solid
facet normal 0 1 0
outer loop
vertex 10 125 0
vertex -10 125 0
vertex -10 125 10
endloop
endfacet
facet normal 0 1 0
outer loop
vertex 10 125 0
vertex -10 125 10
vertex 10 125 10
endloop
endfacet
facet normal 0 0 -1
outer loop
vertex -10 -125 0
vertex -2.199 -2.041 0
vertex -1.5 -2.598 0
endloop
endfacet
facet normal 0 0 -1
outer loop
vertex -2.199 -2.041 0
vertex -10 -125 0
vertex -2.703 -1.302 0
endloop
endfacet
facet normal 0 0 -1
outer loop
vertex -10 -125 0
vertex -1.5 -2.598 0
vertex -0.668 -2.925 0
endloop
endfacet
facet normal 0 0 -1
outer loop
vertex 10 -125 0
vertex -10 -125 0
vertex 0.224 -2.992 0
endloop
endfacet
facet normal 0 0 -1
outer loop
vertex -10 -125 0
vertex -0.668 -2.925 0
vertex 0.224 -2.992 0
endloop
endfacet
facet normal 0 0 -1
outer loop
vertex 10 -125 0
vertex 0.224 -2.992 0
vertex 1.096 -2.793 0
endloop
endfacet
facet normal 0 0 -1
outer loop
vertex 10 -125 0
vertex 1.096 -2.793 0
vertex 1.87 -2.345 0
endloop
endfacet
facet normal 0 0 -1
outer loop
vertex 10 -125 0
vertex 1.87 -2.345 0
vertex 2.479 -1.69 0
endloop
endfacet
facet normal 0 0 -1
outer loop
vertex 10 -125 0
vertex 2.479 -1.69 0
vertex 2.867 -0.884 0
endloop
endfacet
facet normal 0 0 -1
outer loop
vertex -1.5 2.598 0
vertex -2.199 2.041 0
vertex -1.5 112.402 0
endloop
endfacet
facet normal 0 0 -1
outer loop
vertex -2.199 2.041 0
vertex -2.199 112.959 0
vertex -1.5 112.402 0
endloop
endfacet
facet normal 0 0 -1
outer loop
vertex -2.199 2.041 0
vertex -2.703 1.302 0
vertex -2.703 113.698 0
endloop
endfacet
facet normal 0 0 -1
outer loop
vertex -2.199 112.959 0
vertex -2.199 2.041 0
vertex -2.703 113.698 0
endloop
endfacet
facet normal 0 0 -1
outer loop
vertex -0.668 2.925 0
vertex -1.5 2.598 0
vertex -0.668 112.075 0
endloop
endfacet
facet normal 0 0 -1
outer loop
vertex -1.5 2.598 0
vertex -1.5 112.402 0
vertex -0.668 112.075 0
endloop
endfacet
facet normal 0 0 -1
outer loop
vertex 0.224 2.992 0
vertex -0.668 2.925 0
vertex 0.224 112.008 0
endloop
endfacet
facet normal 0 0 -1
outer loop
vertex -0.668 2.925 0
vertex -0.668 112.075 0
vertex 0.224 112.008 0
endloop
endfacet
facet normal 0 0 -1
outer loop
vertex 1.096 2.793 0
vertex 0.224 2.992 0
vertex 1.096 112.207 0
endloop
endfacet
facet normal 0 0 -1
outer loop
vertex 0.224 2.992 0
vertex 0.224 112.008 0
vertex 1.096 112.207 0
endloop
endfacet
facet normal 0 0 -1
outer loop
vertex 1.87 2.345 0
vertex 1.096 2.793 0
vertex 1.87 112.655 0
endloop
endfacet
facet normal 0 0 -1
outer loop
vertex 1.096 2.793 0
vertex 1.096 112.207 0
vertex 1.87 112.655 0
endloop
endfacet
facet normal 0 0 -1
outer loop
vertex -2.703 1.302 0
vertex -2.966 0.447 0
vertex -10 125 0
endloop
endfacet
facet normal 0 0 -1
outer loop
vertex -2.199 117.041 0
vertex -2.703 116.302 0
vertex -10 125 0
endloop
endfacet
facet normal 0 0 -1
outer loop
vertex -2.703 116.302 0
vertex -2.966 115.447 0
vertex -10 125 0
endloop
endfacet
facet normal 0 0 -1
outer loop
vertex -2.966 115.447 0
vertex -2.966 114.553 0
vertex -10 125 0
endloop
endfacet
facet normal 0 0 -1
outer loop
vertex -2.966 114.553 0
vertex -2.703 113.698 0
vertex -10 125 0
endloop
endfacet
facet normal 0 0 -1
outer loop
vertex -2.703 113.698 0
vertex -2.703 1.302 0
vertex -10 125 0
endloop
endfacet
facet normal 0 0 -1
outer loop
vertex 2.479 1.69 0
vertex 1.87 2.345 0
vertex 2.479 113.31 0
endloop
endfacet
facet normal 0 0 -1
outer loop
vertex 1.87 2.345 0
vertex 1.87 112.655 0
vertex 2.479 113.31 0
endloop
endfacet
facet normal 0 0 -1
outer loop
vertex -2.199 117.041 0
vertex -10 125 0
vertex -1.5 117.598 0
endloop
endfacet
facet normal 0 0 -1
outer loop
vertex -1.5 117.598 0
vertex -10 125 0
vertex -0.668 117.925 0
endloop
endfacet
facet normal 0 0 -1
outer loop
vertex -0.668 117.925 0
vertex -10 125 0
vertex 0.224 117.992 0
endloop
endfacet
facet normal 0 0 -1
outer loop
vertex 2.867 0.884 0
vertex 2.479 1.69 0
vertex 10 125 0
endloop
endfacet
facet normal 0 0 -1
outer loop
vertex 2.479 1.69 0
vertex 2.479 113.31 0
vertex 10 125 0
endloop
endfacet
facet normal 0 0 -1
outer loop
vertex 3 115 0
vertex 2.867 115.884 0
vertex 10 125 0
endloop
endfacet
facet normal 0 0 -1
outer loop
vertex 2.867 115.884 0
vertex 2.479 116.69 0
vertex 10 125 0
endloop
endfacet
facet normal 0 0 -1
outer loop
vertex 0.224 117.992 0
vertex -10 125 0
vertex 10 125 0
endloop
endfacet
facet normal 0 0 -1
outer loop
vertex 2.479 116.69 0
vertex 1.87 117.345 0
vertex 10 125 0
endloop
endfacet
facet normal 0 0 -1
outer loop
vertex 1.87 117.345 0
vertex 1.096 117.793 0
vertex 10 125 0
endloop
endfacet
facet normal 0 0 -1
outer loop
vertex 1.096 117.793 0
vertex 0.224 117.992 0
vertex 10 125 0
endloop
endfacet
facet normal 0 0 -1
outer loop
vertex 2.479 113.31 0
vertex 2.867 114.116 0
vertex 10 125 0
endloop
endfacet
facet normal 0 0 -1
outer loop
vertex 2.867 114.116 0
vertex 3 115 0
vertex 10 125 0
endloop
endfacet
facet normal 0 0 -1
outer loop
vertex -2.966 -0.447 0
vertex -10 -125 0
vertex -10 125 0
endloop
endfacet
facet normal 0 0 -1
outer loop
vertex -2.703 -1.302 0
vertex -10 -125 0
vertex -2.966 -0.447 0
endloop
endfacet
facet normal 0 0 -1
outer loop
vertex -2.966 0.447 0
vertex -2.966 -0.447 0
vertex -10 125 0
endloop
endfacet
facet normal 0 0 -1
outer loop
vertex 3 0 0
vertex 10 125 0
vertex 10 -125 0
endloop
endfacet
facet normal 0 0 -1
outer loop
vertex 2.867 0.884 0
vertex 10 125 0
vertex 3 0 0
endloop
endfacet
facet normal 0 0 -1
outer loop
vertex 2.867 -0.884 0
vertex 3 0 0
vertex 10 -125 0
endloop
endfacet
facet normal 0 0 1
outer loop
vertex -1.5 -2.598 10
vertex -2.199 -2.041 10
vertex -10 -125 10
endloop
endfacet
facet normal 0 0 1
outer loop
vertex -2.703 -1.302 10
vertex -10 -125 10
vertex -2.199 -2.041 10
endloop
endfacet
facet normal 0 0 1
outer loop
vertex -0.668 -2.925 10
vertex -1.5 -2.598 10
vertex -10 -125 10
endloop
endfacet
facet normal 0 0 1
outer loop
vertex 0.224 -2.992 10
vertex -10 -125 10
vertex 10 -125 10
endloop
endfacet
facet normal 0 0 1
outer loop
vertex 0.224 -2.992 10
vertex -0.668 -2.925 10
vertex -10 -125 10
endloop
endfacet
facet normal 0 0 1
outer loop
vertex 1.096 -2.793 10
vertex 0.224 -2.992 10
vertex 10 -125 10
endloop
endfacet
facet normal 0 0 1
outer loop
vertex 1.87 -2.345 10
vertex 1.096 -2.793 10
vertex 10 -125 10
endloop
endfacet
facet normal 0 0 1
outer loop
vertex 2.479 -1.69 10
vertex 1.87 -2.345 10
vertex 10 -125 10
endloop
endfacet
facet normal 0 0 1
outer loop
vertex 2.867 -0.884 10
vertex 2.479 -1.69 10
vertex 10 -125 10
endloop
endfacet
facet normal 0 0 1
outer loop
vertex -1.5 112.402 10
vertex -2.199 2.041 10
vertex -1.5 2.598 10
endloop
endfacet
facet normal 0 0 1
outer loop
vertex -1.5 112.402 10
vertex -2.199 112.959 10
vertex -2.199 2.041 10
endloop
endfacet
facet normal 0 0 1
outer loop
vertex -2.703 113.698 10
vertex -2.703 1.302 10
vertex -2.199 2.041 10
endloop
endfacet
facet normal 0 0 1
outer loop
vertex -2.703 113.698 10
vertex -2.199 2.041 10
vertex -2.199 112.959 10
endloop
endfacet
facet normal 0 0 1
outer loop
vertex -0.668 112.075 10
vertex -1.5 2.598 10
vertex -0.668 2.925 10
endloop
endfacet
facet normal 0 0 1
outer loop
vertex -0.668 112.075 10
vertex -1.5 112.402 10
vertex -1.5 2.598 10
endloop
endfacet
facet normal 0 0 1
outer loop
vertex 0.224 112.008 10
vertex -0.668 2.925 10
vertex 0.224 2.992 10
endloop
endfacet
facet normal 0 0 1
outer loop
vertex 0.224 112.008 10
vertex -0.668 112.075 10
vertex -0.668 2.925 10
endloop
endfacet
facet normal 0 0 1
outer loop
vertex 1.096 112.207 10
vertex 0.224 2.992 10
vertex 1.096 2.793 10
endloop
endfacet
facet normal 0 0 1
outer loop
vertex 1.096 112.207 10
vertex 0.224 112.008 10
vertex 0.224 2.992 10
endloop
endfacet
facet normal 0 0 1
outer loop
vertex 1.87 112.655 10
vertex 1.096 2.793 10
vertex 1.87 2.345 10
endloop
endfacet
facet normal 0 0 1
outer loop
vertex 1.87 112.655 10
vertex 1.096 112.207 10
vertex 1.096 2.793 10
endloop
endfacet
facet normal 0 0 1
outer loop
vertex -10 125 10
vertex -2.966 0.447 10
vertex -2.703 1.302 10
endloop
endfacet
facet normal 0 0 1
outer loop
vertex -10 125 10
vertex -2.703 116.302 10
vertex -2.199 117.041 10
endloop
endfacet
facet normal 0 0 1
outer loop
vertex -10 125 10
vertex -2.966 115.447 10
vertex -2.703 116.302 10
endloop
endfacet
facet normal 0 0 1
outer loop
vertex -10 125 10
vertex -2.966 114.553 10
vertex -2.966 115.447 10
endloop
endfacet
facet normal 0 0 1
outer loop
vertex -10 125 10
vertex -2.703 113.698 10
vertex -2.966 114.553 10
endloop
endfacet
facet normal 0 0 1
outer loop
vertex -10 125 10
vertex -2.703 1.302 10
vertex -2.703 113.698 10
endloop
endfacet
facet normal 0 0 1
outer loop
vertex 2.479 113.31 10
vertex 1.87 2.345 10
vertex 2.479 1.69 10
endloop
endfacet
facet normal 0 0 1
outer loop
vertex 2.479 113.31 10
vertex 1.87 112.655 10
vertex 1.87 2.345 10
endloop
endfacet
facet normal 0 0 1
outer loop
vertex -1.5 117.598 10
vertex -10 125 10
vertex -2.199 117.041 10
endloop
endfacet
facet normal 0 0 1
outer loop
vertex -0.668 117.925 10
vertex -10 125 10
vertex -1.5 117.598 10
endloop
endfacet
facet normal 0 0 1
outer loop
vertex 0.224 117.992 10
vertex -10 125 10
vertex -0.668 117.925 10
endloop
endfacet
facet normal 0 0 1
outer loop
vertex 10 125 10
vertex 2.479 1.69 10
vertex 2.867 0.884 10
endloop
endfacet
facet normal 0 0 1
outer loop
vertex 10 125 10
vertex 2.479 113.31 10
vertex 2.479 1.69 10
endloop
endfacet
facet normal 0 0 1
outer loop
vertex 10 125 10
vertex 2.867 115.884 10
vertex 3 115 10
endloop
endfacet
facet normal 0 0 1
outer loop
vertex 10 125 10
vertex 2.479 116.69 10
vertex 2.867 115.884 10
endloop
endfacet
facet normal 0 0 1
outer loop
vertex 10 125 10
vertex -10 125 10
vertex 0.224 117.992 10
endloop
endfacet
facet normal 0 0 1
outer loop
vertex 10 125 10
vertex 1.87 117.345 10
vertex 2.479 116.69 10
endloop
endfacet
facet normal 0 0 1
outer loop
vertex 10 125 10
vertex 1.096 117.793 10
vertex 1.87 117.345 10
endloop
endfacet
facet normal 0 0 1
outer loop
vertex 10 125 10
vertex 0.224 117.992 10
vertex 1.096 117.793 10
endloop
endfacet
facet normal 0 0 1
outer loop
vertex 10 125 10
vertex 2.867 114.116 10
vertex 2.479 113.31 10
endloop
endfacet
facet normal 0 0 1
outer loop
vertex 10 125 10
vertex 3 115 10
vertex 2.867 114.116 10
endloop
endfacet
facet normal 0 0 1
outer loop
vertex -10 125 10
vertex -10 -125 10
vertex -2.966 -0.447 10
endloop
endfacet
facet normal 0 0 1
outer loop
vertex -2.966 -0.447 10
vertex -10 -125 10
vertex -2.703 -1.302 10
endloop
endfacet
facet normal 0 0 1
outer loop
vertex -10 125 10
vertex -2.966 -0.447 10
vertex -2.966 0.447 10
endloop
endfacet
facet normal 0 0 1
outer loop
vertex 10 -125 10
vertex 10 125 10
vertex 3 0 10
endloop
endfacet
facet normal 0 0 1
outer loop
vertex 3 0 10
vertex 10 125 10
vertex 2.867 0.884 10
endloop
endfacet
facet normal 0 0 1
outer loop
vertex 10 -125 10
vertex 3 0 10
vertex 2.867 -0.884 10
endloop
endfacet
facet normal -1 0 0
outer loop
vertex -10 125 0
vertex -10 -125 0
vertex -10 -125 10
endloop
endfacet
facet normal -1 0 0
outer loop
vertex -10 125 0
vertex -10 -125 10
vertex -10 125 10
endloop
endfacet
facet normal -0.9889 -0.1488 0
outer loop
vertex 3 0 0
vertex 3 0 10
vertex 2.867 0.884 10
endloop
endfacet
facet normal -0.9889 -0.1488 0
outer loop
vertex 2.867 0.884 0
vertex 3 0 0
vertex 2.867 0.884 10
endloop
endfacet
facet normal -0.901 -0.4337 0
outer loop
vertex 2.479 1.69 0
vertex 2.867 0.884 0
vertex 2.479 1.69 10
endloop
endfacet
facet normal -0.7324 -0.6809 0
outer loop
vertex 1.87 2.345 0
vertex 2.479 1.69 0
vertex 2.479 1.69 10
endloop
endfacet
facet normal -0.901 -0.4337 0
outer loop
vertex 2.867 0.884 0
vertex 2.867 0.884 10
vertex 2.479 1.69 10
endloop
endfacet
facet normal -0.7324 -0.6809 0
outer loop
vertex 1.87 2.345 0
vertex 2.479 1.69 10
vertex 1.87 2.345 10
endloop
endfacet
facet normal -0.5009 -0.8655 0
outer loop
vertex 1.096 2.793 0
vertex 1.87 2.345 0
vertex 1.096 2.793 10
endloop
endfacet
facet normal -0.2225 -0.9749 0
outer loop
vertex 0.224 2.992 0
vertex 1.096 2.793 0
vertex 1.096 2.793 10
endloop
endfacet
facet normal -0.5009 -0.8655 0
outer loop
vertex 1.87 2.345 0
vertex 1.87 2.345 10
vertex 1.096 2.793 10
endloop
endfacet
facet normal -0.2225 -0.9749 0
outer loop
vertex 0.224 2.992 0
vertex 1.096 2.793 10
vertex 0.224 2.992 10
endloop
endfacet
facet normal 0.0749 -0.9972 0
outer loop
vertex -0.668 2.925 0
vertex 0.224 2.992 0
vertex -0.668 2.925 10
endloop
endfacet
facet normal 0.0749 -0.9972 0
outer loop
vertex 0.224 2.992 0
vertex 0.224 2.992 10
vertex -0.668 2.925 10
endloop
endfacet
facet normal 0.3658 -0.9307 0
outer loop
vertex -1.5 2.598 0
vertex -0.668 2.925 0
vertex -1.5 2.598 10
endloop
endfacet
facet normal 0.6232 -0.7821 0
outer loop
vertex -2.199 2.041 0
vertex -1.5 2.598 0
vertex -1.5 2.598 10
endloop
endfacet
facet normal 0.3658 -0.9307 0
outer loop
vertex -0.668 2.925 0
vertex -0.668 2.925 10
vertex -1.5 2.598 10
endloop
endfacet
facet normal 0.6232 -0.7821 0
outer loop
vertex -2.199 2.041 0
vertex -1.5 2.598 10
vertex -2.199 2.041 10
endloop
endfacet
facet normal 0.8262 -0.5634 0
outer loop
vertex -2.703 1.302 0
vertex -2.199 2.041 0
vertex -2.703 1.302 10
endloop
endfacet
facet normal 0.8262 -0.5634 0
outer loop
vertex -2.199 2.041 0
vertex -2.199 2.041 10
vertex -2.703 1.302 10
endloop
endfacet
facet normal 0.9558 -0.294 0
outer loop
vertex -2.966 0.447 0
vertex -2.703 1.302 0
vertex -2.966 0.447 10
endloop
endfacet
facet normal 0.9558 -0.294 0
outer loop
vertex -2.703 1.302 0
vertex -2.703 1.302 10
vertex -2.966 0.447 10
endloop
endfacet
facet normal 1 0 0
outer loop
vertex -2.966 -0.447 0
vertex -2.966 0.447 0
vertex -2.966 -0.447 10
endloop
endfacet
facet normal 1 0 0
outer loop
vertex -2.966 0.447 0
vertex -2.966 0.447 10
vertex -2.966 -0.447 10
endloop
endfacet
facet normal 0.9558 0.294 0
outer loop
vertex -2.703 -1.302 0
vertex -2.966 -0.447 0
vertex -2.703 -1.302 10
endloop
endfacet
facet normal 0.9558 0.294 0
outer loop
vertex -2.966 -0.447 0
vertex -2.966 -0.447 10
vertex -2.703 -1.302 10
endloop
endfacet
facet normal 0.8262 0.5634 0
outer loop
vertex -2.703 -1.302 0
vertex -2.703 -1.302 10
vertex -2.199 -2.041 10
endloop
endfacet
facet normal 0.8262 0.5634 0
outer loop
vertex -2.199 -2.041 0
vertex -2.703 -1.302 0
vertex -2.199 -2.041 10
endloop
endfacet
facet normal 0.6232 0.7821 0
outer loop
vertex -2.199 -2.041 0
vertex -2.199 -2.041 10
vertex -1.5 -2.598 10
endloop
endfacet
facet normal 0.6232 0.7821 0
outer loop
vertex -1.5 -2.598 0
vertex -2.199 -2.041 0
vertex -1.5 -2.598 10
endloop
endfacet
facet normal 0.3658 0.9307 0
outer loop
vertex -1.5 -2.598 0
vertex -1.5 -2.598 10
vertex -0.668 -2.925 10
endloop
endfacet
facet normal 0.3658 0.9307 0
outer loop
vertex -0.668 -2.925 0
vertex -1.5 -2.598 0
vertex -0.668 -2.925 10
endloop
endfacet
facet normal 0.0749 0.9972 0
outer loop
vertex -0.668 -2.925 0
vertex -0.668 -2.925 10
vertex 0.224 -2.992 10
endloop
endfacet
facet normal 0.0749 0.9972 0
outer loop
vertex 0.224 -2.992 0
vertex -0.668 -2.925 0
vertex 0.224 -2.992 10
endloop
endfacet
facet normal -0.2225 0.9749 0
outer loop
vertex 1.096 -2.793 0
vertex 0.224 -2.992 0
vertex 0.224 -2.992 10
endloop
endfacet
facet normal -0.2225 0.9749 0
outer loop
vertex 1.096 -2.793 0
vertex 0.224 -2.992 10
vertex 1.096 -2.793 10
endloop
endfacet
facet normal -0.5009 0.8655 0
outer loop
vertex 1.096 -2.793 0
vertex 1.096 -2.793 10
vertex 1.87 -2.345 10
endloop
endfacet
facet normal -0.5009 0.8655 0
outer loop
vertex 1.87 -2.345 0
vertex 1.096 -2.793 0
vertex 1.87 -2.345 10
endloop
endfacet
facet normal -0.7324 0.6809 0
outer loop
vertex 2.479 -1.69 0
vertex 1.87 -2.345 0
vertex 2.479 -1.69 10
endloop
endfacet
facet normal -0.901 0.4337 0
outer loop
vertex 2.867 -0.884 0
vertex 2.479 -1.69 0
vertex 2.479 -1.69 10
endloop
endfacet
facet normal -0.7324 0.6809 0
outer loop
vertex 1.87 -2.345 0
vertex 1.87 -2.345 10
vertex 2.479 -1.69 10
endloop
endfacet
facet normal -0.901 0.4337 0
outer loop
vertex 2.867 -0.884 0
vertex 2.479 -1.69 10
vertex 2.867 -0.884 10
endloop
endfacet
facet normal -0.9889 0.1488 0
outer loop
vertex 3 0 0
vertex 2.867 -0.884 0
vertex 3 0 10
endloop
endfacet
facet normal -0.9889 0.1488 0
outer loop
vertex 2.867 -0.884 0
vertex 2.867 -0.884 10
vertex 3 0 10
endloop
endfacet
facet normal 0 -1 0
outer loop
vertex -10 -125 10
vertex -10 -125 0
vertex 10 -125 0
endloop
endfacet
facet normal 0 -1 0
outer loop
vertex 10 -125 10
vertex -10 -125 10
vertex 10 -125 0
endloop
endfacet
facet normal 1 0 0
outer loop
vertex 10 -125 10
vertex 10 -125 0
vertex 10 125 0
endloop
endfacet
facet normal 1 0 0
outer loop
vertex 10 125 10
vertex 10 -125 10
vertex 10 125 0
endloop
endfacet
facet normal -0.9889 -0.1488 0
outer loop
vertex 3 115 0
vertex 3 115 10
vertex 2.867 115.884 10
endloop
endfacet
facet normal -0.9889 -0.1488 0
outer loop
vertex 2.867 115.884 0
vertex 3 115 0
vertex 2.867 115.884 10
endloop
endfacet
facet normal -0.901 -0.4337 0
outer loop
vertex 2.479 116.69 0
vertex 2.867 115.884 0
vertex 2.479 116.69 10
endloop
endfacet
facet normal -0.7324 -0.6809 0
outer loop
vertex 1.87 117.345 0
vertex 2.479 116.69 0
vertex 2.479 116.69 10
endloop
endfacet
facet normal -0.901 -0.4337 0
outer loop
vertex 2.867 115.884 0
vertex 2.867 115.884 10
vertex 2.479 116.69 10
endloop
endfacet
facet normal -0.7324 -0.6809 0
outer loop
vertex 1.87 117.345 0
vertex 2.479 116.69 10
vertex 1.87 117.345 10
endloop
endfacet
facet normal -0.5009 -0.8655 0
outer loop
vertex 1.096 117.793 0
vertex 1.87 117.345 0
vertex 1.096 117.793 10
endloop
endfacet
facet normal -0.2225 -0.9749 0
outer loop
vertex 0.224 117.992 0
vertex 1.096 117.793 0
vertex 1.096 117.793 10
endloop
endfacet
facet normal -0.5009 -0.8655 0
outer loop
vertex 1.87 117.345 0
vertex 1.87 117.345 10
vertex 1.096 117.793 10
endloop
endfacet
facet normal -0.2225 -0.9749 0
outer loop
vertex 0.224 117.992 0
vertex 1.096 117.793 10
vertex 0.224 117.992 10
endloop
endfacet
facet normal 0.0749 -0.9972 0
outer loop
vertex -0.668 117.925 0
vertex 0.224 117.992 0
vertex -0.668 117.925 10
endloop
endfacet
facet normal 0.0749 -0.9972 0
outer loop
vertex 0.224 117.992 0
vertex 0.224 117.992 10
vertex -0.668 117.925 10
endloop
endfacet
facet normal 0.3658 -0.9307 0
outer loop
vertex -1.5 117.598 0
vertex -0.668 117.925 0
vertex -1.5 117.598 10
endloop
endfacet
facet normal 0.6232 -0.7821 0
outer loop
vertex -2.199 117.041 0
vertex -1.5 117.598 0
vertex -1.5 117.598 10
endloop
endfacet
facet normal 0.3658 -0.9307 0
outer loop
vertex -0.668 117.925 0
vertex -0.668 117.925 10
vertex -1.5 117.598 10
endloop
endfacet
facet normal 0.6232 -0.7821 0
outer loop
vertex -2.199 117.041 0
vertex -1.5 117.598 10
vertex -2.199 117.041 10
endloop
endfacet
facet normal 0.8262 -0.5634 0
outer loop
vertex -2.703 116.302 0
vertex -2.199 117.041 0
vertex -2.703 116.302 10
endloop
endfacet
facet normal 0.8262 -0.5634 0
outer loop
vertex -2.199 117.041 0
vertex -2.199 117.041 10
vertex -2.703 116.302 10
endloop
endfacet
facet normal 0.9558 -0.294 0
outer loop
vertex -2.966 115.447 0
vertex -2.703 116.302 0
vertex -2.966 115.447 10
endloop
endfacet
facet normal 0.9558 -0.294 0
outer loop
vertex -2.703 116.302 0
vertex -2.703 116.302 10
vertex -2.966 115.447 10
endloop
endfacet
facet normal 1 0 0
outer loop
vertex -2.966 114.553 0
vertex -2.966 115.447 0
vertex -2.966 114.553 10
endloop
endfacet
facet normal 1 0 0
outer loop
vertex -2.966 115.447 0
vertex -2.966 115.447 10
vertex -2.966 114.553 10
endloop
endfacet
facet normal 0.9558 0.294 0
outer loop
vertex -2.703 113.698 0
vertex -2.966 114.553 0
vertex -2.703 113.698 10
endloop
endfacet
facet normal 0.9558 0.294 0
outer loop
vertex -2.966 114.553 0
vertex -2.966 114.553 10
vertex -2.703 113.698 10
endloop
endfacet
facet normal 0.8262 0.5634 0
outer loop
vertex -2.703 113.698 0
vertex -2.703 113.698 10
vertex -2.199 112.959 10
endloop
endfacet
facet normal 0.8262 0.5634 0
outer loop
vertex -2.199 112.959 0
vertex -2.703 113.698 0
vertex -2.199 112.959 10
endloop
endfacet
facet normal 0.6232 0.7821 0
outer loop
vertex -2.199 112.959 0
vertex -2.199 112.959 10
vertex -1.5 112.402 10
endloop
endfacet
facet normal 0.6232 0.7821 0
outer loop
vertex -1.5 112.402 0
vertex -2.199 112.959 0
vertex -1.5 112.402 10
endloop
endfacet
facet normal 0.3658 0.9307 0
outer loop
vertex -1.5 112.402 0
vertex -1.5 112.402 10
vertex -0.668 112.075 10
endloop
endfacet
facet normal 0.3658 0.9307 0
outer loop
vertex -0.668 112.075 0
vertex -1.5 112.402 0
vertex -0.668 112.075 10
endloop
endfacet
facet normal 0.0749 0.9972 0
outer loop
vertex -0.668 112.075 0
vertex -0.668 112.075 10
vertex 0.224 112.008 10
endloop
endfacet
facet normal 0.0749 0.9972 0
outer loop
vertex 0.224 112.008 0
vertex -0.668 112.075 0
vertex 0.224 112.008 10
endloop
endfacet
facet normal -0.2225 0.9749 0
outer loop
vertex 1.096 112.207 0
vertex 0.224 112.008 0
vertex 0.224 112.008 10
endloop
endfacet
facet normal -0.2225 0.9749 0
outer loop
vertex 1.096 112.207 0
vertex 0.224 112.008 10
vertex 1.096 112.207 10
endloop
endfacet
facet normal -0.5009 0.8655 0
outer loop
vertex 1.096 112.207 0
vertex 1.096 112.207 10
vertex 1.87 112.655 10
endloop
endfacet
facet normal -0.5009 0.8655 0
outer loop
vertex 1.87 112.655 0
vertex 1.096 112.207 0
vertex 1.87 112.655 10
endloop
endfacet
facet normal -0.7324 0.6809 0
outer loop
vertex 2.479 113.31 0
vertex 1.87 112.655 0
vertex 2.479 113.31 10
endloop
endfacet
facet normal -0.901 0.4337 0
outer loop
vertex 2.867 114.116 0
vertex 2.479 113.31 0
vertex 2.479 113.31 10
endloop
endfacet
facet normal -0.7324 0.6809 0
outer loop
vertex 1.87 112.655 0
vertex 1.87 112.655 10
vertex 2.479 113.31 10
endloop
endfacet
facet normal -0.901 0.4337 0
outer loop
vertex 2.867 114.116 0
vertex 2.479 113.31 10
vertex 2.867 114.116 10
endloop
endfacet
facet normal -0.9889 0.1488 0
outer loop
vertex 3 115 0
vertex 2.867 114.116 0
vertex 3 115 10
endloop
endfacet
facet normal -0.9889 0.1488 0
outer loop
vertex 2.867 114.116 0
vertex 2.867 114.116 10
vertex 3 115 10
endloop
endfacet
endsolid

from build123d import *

# Parameters (mm, degrees)
SKETCH1_W           = 20
SKETCH1_H           = 250
BOSS_EXTRUDE1_DEPTH = 10
SKETCH2_R           = 3
CUT_EXTRUDE1_DEPTH  = 10


with BuildPart() as part:
    # Sketch1 → Boss-Extrude1 (new body)
    with BuildSketch(Plane.XY):
        Rectangle(SKETCH1_W, SKETCH1_H)
    extrude(amount=BOSS_EXTRUDE1_DEPTH)

    # Sketch2 → Cut-Extrude1 (cut)
    with BuildSketch(Plane.XY.offset(10)):
        with Locations((0, 115)):
            Circle(SKETCH2_R)
        Circle(SKETCH2_R)
    extrude(amount=-CUT_EXTRUDE1_DEPTH, mode=Mode.SUBTRACT)


solid = part.part
